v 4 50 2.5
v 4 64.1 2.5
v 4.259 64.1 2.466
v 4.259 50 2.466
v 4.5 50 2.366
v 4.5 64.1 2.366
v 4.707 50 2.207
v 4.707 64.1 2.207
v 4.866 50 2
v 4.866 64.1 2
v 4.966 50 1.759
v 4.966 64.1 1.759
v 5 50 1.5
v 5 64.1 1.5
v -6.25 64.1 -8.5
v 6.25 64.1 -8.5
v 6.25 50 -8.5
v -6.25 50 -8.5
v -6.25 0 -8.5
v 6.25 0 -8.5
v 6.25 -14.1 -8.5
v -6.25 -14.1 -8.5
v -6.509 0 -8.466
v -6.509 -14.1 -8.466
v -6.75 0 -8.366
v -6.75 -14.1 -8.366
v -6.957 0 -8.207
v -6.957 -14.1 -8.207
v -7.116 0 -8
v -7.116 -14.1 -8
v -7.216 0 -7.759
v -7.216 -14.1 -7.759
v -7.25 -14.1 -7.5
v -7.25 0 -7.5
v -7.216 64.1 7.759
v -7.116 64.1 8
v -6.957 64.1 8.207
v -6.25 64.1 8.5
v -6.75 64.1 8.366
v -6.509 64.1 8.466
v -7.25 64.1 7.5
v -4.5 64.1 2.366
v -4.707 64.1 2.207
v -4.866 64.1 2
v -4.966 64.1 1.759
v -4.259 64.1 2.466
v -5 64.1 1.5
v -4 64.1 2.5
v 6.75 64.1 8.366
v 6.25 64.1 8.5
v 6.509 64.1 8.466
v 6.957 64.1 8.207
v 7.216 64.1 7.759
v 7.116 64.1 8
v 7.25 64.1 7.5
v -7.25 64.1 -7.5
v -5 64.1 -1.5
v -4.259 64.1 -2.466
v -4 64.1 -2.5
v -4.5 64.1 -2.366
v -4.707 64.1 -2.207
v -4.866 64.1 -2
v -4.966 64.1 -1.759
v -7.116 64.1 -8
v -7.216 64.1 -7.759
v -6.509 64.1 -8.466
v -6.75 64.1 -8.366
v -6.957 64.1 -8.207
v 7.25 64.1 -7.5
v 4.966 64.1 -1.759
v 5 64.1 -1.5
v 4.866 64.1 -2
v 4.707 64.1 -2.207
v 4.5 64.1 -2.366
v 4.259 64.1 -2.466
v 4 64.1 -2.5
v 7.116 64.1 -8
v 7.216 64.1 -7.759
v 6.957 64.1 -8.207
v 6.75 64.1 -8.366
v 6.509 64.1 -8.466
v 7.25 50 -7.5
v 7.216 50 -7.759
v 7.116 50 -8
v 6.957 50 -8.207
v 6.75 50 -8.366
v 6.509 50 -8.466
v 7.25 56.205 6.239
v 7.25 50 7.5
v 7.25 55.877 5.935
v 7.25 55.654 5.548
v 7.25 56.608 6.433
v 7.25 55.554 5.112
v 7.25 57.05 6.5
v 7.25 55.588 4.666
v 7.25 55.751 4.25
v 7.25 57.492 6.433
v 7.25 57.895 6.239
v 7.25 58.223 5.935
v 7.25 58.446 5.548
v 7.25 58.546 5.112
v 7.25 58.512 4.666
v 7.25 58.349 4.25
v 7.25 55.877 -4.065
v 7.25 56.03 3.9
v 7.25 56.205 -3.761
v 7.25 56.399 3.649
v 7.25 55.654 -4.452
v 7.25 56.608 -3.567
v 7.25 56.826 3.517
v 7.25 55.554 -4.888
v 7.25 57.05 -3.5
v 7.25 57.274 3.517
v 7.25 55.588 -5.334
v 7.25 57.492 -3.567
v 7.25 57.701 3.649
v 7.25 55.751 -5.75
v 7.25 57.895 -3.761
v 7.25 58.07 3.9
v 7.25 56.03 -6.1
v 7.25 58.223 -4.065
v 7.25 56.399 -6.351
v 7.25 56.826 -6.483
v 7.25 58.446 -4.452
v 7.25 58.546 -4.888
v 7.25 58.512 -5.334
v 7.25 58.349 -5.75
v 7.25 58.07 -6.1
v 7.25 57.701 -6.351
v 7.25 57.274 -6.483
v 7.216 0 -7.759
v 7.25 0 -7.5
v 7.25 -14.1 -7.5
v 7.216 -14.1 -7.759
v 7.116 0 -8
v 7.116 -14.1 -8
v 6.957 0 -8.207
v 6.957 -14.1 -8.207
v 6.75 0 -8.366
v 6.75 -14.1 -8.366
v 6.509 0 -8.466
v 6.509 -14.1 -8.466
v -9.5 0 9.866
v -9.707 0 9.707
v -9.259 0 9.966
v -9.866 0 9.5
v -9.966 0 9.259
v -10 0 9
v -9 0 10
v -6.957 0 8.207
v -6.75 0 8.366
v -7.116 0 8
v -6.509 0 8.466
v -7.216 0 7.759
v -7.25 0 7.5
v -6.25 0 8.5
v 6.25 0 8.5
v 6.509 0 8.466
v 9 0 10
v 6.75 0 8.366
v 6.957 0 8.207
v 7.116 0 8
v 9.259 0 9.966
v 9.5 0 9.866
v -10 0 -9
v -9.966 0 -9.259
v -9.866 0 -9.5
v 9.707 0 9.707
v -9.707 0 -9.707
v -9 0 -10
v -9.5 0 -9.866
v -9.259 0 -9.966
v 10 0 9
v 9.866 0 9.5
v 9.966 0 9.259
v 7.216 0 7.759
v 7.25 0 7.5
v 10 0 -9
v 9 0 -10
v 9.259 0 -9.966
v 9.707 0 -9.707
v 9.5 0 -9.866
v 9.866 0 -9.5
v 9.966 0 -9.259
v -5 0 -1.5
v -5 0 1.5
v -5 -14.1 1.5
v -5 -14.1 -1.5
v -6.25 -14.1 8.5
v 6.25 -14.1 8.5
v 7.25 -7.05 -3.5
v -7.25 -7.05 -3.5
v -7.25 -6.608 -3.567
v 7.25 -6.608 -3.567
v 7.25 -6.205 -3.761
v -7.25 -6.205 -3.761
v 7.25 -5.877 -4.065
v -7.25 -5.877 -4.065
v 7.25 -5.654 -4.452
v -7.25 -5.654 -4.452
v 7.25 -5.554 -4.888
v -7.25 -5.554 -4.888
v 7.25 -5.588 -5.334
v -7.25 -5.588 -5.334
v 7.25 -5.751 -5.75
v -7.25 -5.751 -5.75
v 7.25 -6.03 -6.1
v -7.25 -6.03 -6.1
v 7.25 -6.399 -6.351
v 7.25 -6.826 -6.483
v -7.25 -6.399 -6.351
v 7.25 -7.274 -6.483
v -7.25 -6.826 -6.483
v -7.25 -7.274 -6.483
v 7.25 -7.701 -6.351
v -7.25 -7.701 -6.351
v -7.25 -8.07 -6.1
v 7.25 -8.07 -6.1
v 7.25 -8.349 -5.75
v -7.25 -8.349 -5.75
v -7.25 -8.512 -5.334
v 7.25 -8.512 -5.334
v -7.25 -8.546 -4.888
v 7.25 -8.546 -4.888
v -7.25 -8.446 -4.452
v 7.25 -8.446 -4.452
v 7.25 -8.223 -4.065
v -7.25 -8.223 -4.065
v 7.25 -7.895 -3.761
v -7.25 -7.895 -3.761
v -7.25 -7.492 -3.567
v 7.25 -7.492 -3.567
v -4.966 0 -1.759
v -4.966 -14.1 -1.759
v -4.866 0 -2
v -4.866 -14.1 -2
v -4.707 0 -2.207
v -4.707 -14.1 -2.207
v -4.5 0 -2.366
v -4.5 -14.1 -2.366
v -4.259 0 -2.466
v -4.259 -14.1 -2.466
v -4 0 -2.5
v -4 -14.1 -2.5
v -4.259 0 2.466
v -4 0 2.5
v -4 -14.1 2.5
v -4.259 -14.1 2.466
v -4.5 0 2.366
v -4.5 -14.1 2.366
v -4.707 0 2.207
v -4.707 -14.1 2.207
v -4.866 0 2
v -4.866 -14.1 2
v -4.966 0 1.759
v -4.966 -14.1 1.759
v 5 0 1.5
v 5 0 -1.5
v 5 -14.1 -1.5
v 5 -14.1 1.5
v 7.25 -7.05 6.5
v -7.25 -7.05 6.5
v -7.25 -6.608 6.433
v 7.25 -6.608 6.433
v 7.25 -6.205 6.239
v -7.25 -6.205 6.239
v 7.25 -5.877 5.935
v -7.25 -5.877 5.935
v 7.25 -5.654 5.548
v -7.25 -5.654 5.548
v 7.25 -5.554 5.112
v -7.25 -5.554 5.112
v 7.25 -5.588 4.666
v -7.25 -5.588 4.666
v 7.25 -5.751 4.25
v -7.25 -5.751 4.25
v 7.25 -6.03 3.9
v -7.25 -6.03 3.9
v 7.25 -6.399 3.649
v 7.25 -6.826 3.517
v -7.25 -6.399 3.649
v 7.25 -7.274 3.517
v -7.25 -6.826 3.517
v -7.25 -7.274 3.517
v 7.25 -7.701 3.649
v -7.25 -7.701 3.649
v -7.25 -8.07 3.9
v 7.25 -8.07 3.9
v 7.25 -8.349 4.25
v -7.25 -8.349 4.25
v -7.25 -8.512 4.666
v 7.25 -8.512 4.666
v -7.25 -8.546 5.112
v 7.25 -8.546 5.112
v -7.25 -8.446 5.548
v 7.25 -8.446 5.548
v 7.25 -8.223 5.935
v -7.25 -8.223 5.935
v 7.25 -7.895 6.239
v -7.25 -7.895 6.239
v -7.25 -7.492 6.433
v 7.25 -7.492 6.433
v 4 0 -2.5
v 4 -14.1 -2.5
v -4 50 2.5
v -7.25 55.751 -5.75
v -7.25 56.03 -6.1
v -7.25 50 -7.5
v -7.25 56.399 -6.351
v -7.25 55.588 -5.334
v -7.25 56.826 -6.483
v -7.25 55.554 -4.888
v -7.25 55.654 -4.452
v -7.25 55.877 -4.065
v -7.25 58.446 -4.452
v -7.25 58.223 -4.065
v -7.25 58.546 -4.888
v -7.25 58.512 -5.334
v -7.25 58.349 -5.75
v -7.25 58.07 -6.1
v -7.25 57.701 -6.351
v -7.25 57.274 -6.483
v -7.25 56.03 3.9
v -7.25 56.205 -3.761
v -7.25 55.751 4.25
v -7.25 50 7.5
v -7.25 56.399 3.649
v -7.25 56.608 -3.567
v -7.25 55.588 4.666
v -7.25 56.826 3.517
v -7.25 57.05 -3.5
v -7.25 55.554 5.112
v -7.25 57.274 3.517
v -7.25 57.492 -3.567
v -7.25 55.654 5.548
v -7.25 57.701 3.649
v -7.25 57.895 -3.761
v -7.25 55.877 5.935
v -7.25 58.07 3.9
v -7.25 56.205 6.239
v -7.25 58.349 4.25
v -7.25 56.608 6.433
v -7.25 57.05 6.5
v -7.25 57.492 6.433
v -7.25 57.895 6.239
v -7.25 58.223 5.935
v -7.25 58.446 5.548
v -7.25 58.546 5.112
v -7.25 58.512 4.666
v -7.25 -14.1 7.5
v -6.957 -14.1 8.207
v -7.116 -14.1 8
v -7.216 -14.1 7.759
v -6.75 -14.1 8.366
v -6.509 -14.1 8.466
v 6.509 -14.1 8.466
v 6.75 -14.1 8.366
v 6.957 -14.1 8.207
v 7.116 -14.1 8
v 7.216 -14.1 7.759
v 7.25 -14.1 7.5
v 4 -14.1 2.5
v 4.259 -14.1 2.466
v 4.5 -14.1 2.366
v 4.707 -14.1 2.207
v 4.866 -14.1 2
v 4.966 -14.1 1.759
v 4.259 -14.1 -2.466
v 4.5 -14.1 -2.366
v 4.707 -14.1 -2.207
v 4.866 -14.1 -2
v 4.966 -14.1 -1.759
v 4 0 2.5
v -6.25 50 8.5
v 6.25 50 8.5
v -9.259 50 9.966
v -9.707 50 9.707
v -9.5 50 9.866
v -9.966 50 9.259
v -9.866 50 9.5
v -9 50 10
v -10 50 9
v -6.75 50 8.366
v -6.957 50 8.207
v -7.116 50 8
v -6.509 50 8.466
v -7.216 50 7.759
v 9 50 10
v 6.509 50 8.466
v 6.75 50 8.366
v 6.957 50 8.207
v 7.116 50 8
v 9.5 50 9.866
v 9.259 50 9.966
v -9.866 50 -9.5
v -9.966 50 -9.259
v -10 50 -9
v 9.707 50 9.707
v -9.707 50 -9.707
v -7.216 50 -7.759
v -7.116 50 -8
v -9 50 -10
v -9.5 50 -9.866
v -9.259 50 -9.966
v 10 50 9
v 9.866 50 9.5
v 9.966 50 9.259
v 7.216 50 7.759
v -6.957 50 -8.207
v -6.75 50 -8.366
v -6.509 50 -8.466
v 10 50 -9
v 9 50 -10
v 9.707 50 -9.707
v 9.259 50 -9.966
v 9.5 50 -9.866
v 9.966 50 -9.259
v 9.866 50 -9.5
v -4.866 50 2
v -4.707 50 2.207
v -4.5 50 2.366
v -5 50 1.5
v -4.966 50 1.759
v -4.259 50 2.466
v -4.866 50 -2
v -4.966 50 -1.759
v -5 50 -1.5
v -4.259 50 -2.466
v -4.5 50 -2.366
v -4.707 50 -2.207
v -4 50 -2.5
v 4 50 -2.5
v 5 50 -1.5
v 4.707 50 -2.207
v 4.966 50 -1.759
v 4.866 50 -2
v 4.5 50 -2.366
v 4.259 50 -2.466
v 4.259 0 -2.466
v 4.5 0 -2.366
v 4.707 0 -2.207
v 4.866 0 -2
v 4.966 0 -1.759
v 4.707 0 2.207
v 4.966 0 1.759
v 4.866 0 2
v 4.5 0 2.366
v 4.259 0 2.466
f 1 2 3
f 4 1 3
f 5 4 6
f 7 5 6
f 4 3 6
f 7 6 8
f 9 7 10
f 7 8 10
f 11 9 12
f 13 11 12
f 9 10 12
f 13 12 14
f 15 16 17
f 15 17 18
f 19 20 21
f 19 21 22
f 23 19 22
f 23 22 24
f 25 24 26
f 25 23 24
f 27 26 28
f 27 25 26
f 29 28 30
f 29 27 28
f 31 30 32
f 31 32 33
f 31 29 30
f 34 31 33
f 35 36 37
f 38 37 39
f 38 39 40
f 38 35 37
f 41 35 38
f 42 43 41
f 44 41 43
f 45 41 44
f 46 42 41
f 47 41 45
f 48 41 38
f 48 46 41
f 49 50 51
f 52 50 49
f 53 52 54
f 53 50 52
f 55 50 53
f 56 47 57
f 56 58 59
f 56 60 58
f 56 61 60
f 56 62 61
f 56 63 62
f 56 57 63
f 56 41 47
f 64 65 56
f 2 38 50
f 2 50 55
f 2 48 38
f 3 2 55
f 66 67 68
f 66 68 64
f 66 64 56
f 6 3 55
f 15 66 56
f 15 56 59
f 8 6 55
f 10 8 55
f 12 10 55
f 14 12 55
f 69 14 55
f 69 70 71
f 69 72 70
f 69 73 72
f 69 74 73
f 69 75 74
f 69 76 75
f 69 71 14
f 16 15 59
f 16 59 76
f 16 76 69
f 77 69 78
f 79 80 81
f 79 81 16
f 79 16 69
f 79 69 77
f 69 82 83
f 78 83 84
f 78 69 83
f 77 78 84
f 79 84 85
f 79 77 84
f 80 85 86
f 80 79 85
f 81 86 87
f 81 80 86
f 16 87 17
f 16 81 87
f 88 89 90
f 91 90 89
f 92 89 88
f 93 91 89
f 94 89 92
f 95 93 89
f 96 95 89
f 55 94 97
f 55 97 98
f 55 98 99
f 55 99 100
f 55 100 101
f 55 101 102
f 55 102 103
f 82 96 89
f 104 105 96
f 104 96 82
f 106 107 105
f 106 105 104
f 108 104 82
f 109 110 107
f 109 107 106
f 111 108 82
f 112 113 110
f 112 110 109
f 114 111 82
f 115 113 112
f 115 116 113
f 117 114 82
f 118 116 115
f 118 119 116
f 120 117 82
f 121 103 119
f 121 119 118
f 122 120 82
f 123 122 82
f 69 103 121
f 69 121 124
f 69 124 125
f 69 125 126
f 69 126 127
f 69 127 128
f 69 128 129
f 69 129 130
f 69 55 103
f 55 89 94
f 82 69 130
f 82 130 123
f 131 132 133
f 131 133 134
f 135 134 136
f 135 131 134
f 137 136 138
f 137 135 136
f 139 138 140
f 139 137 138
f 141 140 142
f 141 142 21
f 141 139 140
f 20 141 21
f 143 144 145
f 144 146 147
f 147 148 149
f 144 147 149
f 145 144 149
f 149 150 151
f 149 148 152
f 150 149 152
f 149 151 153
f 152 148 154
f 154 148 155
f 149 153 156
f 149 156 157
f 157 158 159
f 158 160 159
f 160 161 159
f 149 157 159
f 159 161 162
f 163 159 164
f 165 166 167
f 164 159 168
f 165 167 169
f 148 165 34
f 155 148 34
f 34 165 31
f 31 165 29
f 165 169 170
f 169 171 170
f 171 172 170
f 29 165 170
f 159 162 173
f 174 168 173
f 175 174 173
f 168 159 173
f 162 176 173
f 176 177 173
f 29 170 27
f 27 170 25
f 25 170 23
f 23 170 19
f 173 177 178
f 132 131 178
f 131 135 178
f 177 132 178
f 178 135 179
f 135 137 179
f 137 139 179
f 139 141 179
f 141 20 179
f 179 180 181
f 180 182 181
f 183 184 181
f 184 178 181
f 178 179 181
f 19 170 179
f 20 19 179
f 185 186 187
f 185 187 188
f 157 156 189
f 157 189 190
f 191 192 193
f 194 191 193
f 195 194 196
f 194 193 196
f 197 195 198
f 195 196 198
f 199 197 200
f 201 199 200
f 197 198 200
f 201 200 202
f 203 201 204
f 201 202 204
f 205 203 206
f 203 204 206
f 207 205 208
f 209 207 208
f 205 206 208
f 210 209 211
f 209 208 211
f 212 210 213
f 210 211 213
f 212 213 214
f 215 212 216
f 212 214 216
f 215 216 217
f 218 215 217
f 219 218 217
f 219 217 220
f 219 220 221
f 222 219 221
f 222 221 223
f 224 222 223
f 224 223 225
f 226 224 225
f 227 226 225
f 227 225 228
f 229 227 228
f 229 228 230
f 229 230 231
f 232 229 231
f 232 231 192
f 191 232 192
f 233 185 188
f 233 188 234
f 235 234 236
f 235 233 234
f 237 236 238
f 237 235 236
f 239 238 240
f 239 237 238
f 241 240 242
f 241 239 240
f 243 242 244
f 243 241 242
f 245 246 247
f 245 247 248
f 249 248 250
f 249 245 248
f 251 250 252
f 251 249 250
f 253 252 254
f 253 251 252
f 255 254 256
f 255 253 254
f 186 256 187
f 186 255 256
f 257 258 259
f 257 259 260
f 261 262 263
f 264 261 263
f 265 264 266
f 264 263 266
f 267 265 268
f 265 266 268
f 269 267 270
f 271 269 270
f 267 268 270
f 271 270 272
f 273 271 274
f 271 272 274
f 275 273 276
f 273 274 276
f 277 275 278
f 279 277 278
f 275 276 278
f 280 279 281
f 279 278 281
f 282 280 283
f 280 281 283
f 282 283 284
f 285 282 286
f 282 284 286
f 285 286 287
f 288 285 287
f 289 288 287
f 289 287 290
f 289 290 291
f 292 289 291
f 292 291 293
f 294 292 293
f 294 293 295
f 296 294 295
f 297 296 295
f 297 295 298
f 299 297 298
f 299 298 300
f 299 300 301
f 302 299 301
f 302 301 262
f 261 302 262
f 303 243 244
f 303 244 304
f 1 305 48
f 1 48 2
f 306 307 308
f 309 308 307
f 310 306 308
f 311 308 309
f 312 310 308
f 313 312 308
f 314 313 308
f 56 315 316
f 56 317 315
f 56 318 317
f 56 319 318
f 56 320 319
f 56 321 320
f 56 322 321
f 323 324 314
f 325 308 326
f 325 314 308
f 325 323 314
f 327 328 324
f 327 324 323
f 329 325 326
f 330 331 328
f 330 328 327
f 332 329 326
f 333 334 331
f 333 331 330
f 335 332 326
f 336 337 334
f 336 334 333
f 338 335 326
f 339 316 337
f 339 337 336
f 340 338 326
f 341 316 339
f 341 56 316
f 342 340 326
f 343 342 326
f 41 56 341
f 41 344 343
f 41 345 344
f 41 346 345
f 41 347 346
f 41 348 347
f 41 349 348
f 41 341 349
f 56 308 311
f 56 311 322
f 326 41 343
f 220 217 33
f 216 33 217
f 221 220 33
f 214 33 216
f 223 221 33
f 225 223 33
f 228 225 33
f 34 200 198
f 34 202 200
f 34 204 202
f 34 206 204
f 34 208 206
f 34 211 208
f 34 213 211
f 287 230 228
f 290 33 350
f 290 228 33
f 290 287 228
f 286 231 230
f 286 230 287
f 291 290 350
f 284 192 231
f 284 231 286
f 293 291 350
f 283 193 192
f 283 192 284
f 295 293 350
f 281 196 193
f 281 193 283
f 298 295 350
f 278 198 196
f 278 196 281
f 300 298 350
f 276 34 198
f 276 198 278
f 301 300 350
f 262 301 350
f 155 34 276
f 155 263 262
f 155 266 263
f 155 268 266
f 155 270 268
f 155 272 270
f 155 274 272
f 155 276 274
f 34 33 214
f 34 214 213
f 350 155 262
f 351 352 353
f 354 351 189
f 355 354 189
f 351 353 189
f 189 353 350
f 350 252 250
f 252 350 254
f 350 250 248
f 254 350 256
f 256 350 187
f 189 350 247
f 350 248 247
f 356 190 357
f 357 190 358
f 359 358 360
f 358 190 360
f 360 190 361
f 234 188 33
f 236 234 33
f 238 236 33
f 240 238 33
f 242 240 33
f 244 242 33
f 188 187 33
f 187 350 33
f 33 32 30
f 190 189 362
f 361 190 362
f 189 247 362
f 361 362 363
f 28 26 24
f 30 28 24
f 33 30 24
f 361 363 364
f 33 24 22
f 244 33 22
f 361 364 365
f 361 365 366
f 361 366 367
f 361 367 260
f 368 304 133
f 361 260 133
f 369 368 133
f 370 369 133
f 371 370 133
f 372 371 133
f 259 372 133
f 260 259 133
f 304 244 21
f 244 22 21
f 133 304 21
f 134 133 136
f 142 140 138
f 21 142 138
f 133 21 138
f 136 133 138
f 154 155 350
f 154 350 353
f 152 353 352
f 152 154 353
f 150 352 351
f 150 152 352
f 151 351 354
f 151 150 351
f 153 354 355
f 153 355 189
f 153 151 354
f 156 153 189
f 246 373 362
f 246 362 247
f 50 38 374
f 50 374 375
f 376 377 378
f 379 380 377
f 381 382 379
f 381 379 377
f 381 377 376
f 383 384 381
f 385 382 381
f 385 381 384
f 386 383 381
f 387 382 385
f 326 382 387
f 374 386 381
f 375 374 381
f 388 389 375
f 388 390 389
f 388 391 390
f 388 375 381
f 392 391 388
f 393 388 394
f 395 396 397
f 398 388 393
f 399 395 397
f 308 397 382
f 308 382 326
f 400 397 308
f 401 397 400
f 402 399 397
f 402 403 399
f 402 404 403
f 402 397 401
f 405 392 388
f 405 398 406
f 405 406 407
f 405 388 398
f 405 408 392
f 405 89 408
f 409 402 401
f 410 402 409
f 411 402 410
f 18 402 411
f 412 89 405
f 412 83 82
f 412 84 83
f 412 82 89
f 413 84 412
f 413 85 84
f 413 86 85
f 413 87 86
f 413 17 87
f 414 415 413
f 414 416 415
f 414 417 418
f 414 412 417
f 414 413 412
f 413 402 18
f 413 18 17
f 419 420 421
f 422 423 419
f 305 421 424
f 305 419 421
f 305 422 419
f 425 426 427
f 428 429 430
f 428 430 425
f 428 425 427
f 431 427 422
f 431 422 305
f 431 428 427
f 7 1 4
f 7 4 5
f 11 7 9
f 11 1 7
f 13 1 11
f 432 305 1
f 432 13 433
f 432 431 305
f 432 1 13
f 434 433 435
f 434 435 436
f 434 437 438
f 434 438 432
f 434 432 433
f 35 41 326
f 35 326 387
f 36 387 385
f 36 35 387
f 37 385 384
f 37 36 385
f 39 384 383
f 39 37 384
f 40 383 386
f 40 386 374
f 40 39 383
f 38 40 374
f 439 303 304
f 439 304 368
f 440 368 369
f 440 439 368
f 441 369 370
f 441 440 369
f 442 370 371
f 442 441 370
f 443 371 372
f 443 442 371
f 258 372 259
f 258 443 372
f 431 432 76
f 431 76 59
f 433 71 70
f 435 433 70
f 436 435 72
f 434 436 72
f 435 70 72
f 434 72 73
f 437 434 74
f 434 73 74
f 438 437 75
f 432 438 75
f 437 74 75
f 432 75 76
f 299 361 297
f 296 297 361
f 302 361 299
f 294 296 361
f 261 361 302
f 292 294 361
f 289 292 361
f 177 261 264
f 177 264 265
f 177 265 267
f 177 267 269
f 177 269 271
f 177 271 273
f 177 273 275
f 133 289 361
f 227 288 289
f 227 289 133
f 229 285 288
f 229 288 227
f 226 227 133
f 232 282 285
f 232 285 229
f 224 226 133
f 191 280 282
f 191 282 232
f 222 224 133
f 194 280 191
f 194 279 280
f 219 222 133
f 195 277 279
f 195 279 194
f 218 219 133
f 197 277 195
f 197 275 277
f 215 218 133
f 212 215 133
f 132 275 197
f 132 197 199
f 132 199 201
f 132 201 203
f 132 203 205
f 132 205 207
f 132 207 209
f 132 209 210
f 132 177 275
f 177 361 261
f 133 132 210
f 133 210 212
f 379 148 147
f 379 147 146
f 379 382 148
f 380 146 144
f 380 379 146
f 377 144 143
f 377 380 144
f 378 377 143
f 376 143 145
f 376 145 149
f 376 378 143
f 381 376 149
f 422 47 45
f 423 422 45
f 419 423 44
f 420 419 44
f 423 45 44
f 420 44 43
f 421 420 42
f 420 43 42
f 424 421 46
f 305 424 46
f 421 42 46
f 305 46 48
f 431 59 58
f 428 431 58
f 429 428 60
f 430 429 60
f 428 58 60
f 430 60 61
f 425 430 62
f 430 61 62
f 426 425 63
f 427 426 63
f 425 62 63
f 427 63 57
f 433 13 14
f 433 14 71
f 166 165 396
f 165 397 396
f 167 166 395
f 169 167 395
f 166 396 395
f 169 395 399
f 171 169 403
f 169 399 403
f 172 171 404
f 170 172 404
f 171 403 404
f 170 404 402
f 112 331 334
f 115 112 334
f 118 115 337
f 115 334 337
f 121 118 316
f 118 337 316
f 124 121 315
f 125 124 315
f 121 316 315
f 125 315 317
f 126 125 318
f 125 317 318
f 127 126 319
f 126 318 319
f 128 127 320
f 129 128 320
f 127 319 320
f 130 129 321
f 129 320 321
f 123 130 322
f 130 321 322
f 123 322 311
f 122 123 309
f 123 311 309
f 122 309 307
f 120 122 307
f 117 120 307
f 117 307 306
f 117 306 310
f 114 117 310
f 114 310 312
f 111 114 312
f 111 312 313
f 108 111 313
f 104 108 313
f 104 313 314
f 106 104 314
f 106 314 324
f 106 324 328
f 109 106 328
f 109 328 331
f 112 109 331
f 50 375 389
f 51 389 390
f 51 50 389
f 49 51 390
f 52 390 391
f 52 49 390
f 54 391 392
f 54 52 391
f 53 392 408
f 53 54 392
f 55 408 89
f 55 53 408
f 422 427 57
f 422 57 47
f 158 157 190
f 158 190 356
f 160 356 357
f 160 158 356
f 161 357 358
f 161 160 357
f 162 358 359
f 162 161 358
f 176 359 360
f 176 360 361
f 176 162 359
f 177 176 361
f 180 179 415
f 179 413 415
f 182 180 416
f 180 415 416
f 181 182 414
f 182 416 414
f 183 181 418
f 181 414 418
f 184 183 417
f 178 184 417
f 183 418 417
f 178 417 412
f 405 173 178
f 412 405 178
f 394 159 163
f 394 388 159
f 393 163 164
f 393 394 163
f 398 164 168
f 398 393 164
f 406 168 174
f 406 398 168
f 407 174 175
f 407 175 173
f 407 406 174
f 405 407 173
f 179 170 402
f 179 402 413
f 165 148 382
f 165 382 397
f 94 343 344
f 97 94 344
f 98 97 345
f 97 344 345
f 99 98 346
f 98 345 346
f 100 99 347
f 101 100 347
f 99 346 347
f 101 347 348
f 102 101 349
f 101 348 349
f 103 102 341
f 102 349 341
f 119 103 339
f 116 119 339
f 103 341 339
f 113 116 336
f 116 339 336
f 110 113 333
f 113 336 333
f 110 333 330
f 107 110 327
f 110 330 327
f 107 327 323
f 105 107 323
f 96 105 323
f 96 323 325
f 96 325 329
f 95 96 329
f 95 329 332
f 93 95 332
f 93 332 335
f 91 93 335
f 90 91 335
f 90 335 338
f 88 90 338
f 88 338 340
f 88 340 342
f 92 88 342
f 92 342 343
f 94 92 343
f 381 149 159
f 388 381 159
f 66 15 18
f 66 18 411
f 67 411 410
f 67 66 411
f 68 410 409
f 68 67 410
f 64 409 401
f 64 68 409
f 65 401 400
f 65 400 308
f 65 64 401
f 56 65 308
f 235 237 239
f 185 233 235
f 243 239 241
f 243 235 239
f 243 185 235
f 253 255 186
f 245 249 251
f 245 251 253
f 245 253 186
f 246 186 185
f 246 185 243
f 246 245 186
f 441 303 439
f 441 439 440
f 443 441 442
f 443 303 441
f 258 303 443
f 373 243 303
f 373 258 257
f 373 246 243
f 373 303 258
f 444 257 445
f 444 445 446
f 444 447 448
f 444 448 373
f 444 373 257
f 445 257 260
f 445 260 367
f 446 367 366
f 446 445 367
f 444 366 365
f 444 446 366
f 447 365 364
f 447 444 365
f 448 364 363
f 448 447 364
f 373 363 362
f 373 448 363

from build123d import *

# Parameters (mm, degrees)
SKETCH1_W             = 20
SKETCH1_H             = 20
BOSS_EXTRUDE1_DEPTH   = 50
BOSS_EXTRUDE2_DEPTH   = 39.1
CUT_EXTRUDE1_DEPTH    = 14.1
CUT_EXTRUDE2_START    = -14.1
CUT_EXTRUDE2_DEPTH    = 14.1
M3X0_5_TAPPED_HOLE1_D = 3
FILLET1_R             = 1


with BuildPart() as part:
    # Sketch1 → Boss-Extrude1 (new body)
    with BuildSketch(Plane(origin=(0, 0, 0), x_dir=(1, 0, 0), z_dir=(0, 1, 0))):
        Rectangle(SKETCH1_W, SKETCH1_H)
    extrude(amount=BOSS_EXTRUDE1_DEPTH)

    # Sketch2 → Boss-Extrude2 (add, symmetric)
    with BuildSketch(Plane(origin=(0, 25, 0), x_dir=(1, 0, 0), z_dir=(0, 1, 0))):
        with BuildLine():
            Line((-6.25, -8.5), (6.25, -8.5))
            ThreePointArc((6.25, -8.5), (6.957106781, -8.207106781), (7.25, -7.5))
            Line((7.25, -7.5), (7.25, 7.5))
            ThreePointArc((7.25, 7.5), (6.957106781, 8.207106781), (6.25, 8.5))
            Line((6.25, 8.5), (-6.25, 8.5))
            ThreePointArc((-6.25, 8.5), (-6.957106781, 8.207106781), (-7.25, 7.5))
            Line((-7.25, 7.5), (-7.25, -7.5))
            ThreePointArc((-7.25, -7.5), (-6.957106781, -8.207106781), (-6.25, -8.5))
        make_face()
    extrude(amount=BOSS_EXTRUDE2_DEPTH, both=True)

    # Sketch3 → Cut-Extrude1 (cut)
    with BuildSketch(Plane(origin=(0, 64.1, 0), x_dir=(1, 0, 0), z_dir=(0, 1, 0))):
        with BuildLine():
            Line((-4, -2.5), (4, -2.5))
            ThreePointArc((4, -2.5), (4.707106781, -2.207106781), (5, -1.5))
            Line((5, -1.5), (5, 1.5))
            ThreePointArc((5, 1.5), (4.707106781, 2.207106781), (4, 2.5))
            Line((4, 2.5), (-4, 2.5))
            ThreePointArc((-4, 2.5), (-4.707106781, 2.207106781), (-5, 1.5))
            Line((-5, 1.5), (-5, -1.5))
            ThreePointArc((-5, -1.5), (-4.707106781, -2.207106781), (-4, -2.5))
        make_face()
    extrude(amount=-CUT_EXTRUDE1_DEPTH, mode=Mode.SUBTRACT)

    # Sketch4 → Cut-Extrude2 (cut)
    with BuildSketch(Plane.XZ.offset(14.1).offset(CUT_EXTRUDE2_START)):
        with BuildLine():
            Line((-4, -2.5), (4, -2.5))
            ThreePointArc((4, -2.5), (4.707106781, -2.207106781), (5, -1.5))
            Line((5, -1.5), (5, 1.5))
            ThreePointArc((5, 1.5), (4.707106781, 2.207106781), (4, 2.5))
            Line((4, 2.5), (-4, 2.5))
            ThreePointArc((-4, 2.5), (-4.707106781, 2.207106781), (-5, 1.5))
            Line((-5, 1.5), (-5, -1.5))
            ThreePointArc((-5, -1.5), (-4.707106781, -2.207106781), (-4, -2.5))
        make_face()
    extrude(amount=CUT_EXTRUDE2_DEPTH, mode=Mode.SUBTRACT)

    # M3x0.5 Tapped Hole1 (through all)
    with Locations(Plane(origin=(7.25, 0, 0), x_dir=(0, 0, -1), z_dir=(1, 0, 0))):
        with Locations((5, 57.05), (5, -7.05), (-5, 57.05), (-5, -7.05)):
            Hole(M3X0_5_TAPPED_HOLE1_D / 2)

    # Fillet1
    fillet1_edges = [part.edges().sort_by_distance(p)[0] for p in [
        (10, 25, 10),
        (-10, 25, 10),
        (-10, 25, -10),
        (10, 25, -10),
    ]]
    fillet(fillet1_edges, radius=FILLET1_R)


solid = part.part
